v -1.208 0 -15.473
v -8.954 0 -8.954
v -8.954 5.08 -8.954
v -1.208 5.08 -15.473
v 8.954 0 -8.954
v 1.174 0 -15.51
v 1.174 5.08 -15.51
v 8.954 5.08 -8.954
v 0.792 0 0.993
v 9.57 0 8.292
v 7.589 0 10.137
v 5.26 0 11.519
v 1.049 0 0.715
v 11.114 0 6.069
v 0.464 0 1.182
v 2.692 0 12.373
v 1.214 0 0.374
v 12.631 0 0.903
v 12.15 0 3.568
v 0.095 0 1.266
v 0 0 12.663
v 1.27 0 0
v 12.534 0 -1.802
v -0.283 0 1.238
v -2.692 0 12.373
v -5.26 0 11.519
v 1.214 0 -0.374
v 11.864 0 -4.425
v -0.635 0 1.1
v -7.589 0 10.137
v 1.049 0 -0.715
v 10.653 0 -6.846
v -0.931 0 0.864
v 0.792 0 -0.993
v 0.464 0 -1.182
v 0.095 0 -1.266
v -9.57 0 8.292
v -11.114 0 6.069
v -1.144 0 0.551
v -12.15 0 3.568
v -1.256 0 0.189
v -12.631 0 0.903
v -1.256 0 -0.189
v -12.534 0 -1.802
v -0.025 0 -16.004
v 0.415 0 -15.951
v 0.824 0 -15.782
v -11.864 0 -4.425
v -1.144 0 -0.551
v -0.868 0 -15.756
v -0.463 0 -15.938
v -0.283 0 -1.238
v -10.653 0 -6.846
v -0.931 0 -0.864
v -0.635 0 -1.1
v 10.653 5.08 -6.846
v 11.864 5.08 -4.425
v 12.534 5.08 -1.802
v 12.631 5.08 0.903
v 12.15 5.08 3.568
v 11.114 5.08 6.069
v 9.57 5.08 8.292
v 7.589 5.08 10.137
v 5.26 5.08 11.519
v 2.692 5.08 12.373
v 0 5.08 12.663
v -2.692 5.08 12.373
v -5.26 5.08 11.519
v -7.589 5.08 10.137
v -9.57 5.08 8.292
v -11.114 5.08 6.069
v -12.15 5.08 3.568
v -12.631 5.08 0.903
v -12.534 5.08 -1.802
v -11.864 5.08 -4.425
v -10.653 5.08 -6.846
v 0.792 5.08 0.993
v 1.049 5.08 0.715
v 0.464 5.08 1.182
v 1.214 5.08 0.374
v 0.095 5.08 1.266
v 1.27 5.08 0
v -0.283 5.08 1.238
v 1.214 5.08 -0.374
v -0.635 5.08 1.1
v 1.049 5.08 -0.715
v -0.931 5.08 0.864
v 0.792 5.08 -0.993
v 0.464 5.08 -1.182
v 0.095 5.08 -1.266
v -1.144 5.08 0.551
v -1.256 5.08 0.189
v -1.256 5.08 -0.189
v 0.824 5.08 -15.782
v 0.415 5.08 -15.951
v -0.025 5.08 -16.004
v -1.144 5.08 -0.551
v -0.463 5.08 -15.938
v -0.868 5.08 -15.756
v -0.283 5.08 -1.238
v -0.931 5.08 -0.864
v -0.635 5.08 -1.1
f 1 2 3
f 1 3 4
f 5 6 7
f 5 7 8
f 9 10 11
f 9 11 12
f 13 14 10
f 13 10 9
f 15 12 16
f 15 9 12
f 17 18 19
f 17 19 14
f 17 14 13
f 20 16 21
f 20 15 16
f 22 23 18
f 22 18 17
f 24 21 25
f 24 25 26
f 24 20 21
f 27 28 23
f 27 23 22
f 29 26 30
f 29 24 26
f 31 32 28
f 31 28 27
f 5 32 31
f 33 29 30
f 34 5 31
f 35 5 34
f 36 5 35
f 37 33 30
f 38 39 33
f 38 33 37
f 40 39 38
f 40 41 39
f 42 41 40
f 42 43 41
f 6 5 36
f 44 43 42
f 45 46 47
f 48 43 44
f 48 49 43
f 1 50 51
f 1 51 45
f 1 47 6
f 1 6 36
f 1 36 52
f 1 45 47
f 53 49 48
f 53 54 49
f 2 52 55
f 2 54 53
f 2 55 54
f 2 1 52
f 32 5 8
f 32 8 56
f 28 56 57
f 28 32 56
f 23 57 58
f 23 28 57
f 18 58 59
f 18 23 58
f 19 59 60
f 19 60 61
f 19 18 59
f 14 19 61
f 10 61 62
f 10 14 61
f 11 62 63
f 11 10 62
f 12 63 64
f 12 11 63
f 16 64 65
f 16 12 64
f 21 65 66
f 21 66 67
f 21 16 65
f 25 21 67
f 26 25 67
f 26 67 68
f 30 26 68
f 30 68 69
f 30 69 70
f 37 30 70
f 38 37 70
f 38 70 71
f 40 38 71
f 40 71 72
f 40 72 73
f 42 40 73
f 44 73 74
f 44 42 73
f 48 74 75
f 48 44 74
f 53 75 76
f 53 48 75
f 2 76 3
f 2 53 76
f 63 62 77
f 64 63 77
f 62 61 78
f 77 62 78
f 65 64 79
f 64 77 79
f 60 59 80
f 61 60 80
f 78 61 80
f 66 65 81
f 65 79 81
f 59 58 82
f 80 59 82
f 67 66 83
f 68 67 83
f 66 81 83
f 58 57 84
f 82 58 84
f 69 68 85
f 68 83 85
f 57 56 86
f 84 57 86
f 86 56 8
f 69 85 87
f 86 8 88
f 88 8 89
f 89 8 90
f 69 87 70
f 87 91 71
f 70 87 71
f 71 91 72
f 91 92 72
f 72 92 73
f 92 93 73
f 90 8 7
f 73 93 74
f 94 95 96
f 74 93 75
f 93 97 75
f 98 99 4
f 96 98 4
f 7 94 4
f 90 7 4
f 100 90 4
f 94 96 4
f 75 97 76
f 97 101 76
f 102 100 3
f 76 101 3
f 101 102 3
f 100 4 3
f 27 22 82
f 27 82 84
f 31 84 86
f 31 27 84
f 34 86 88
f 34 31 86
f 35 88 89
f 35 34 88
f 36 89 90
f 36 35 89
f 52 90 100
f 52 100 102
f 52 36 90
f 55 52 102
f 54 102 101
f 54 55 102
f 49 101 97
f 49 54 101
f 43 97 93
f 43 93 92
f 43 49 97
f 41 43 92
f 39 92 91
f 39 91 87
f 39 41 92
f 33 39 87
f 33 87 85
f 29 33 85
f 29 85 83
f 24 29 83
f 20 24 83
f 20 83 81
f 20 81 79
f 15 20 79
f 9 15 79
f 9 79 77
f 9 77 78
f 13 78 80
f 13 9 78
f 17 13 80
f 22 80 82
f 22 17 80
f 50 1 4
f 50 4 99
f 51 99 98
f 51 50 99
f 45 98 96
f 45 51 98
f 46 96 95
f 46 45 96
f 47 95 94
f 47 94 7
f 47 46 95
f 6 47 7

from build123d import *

# Parameters (mm, degrees)
SKETCH1_R           = 1.27
BOSS_EXTRUDE2_DEPTH = 5.08


with BuildPart() as part:
    # Sketch1 → Boss-Extrude2 (new body)
    with BuildSketch(Plane(origin=(0, 0, 0), x_dir=(1, 0, 0), z_dir=(0, 1, 0))):
        with BuildLine():
            Line((-8.953988524, 8.953988524), (-1.208326736, 15.472743004))
            ThreePointArc((-1.208326736, 15.472743004), (-0.025328041, 16.00445947), (1.173542757, 15.50956845))
            Line((1.173542757, 15.50956845), (8.953988524, 8.953988524))
            ThreePointArc((8.953988524, 8.953988524), (0, -12.662852008), (-8.953988524, 8.953988524))
        make_face()
        Circle(SKETCH1_R, mode=Mode.SUBTRACT)
    extrude(amount=BOSS_EXTRUDE2_DEPTH)


solid = part.part
